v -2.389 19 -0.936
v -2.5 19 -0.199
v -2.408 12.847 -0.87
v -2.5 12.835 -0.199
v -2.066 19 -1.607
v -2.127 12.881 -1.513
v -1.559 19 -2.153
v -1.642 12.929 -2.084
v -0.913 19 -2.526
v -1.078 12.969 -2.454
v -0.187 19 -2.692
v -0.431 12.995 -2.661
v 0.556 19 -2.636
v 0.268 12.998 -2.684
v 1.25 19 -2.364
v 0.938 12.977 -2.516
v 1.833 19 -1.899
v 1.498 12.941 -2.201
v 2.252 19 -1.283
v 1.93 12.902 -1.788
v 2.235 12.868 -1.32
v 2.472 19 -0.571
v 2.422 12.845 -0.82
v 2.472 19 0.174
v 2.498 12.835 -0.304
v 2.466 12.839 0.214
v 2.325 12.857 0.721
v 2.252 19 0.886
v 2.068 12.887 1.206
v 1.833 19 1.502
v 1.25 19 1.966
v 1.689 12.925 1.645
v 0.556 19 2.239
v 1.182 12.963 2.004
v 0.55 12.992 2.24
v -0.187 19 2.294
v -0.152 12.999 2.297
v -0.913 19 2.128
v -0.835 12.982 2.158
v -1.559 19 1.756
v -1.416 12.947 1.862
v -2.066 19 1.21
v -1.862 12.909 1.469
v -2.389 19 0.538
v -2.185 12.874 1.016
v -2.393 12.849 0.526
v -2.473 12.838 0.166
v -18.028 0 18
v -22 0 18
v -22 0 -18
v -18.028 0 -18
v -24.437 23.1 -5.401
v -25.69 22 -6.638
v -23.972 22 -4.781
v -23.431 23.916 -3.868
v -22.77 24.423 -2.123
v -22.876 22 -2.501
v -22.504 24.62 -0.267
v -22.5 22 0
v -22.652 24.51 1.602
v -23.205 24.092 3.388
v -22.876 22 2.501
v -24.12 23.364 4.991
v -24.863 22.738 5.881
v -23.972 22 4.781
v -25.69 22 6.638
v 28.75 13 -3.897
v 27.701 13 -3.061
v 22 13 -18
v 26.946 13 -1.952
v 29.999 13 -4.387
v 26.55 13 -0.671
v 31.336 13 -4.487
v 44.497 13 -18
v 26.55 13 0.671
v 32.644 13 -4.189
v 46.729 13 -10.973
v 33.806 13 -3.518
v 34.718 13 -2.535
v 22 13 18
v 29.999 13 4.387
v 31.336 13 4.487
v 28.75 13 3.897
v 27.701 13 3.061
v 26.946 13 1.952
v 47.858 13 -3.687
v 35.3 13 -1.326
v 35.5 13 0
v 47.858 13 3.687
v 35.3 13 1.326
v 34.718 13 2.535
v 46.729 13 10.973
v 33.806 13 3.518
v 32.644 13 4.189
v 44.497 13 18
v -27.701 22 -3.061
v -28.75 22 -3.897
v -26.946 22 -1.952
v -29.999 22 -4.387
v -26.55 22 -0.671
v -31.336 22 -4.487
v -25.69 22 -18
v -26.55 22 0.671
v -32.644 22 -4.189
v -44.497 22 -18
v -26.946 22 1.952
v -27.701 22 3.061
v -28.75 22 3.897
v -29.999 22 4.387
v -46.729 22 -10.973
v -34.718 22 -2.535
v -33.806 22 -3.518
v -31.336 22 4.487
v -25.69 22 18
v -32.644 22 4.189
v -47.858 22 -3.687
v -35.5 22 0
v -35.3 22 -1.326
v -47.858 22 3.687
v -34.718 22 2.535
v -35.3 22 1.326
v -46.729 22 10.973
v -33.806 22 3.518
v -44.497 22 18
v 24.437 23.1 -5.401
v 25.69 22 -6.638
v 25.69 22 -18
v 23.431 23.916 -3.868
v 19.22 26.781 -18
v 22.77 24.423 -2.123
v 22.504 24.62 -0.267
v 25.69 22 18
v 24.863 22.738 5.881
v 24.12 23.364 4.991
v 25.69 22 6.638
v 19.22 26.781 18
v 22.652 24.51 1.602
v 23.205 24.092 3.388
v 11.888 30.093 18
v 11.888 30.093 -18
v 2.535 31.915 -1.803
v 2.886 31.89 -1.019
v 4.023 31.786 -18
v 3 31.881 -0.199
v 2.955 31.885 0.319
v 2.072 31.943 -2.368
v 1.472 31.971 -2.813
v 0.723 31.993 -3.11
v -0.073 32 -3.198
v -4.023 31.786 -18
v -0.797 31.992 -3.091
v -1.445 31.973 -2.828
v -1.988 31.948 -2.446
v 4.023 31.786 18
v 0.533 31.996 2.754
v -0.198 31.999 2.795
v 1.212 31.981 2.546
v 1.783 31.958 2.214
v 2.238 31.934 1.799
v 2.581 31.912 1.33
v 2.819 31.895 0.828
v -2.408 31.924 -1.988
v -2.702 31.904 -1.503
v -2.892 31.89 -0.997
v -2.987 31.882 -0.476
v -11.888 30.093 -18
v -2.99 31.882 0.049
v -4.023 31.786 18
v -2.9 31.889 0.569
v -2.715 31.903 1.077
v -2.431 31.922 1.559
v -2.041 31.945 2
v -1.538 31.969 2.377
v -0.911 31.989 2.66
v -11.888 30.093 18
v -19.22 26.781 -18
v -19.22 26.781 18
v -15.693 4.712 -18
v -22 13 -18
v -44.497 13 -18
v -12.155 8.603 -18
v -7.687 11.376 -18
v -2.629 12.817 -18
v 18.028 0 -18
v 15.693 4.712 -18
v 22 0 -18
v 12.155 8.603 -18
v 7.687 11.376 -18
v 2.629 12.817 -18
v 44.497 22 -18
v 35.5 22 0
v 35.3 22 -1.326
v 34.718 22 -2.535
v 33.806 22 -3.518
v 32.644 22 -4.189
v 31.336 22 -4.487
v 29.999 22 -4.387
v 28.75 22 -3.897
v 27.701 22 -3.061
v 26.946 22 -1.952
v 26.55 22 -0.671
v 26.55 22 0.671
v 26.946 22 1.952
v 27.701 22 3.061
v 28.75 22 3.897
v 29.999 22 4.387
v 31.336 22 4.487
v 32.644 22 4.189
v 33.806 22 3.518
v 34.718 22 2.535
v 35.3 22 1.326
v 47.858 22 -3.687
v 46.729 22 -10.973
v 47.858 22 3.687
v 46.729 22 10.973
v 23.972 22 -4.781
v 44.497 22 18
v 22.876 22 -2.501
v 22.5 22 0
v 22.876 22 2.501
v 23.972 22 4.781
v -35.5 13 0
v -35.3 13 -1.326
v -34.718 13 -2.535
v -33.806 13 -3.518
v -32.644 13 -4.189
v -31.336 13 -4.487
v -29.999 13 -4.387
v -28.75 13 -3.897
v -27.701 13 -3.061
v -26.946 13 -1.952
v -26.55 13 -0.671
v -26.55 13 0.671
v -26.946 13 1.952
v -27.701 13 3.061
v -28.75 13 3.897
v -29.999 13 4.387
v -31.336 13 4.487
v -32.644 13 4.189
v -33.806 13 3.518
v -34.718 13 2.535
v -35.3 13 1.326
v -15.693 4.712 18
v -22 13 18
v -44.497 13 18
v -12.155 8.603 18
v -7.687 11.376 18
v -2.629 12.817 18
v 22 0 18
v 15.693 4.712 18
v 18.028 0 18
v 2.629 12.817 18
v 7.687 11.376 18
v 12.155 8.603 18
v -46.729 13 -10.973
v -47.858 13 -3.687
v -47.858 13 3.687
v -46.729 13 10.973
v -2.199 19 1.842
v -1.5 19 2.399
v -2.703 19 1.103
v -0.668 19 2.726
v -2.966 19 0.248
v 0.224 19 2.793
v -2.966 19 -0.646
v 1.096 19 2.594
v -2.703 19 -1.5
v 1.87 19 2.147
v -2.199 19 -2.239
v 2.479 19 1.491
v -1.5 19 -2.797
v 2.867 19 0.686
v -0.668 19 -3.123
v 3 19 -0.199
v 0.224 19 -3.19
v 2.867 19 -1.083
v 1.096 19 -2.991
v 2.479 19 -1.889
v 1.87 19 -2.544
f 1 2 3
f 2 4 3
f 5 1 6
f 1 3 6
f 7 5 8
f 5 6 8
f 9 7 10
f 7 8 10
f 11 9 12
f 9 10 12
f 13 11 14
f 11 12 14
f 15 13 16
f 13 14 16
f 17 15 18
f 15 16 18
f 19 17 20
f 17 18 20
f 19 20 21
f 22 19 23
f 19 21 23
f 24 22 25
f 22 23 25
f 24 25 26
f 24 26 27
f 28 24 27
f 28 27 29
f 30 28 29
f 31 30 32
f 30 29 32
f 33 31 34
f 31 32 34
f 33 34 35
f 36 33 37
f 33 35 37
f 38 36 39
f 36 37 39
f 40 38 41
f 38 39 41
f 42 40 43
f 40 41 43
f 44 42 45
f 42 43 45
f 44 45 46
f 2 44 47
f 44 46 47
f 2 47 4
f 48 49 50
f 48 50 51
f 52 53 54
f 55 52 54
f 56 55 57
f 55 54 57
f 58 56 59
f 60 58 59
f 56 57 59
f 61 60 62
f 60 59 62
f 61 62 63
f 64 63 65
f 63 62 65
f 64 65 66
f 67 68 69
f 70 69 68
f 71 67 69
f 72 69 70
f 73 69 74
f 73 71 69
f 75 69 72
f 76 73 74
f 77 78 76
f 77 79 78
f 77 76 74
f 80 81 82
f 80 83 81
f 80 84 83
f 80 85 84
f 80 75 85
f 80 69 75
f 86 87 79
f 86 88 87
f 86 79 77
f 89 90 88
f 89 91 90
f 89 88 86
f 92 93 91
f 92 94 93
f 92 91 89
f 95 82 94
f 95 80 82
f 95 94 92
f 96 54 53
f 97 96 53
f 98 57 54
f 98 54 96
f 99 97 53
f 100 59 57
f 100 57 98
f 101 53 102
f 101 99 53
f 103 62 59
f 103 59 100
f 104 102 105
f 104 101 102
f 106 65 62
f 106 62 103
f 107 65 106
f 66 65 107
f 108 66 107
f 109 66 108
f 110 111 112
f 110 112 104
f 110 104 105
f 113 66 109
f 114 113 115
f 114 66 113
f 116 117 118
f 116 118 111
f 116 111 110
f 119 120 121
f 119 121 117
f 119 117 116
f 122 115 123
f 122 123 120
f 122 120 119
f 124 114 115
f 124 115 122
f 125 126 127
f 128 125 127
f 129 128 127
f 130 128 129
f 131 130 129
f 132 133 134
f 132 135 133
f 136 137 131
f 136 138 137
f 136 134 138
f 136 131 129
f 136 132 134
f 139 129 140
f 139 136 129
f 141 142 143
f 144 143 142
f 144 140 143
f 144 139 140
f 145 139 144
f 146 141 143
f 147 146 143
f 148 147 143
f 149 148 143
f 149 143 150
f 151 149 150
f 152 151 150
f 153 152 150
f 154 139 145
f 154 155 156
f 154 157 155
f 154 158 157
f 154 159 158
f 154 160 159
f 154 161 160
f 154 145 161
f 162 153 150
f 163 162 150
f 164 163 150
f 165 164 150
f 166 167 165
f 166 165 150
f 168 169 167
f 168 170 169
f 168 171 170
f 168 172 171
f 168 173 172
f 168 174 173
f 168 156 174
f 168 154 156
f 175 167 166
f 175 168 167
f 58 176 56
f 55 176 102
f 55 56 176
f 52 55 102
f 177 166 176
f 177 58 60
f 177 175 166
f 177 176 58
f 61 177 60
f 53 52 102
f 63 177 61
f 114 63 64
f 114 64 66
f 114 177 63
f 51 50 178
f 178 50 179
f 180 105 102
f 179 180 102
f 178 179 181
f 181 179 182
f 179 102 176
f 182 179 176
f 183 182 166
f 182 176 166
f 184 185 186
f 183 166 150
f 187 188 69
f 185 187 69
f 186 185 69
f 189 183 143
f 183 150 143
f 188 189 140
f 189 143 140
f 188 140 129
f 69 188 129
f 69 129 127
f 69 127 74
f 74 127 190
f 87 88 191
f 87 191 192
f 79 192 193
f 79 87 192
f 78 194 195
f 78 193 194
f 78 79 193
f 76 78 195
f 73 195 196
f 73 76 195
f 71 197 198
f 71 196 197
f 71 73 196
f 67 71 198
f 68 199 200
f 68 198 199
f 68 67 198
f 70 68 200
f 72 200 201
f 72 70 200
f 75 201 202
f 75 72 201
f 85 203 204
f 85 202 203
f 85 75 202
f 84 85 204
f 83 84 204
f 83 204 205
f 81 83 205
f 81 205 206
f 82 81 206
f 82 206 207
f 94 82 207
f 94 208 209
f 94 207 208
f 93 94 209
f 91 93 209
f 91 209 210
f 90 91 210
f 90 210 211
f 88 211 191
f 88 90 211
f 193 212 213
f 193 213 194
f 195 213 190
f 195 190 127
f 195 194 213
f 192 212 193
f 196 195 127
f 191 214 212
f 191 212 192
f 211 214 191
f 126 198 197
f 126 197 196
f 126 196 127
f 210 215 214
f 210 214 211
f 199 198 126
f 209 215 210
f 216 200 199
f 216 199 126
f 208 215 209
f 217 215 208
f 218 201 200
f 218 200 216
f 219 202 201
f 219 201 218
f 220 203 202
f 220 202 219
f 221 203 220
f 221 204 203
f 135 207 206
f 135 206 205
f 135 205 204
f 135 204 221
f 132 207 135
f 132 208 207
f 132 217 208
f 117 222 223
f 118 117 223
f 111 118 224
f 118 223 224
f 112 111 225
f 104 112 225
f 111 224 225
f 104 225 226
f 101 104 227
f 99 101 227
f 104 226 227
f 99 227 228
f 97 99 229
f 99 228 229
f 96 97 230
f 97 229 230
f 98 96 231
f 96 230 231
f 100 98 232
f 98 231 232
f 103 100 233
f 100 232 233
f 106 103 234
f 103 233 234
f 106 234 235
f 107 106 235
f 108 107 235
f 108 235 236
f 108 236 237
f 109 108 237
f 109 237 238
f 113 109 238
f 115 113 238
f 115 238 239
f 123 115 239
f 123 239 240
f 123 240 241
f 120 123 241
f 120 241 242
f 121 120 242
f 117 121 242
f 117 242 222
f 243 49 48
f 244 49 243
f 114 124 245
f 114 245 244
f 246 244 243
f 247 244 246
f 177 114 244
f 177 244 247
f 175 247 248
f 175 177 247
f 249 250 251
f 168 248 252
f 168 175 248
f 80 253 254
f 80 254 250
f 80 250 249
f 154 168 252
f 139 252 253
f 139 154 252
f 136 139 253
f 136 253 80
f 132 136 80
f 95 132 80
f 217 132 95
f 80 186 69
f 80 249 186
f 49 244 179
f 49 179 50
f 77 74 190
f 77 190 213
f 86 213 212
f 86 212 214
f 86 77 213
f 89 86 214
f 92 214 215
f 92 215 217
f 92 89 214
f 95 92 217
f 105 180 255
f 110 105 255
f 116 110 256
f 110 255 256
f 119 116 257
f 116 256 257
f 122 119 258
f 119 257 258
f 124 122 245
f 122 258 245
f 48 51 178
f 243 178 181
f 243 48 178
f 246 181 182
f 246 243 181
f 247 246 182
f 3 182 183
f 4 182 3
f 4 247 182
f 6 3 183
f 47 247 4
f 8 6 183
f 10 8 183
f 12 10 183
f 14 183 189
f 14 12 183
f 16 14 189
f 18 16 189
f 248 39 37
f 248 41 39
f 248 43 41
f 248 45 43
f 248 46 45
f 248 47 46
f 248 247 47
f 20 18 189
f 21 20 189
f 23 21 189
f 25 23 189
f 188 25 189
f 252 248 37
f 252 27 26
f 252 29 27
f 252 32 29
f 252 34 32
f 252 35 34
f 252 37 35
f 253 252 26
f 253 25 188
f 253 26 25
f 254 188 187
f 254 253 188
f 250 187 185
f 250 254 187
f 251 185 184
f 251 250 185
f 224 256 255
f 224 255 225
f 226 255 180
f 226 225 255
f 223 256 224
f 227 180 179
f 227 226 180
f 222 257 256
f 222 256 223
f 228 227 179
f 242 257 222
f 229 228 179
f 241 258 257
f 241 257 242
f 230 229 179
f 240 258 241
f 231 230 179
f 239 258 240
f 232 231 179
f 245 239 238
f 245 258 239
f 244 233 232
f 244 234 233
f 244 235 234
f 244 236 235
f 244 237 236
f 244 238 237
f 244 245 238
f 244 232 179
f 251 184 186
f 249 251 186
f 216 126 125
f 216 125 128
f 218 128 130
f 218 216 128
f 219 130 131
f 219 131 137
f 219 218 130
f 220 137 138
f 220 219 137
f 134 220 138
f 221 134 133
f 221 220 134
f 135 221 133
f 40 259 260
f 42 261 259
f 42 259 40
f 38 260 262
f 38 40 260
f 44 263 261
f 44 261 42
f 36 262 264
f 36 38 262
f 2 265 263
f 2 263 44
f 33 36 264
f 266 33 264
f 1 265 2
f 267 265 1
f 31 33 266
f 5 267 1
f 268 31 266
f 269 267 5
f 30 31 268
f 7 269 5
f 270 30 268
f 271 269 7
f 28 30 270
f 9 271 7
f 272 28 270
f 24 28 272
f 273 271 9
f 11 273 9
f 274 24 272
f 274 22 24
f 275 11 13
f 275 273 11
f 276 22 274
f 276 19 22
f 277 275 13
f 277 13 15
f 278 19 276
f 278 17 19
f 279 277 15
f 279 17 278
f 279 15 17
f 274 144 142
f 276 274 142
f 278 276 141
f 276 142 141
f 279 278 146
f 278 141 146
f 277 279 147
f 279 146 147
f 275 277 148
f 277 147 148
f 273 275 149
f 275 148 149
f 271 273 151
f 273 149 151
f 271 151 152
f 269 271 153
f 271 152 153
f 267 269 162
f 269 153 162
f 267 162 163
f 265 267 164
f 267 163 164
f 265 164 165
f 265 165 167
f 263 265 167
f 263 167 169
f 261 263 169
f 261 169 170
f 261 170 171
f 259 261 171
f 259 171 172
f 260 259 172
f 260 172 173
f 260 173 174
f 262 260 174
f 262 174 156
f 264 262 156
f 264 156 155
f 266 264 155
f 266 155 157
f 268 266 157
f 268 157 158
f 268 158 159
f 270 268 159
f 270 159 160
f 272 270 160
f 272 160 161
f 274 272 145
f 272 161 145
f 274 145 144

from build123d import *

# Parameters (mm, degrees)
BOSS_EXTRUDE1_DEPTH                     = 18
F_10_0MM_DOWEL_HOLE4_D                  = 9
CBORE_FOR_M5_HEX_HEAD_BOLT1_D           = 5
CBORE_FOR_M5_HEX_HEAD_BOLT1_CBORE_D     = 6
CBORE_FOR_M5_HEX_HEAD_BOLT1_CBORE_DEPTH = 13
CUT_EXTRUDE1_DEPTH                      = 20.0000001
CUT_EXTRUDE7_DEPTH                      = 10


with BuildPart() as part:
    # Sketch1 → Boss-Extrude1 (new body, symmetric)
    with BuildSketch(Plane.XY):
        with BuildLine():
            Line((22, 0), (22, 13))
            Line((22, 13), (50, 13))
            Line((50, 13), (50, 22))
            Line((50, 22), (25.690465157, 22))
            ThreePointArc((25.690465157, 22), (0, 32), (-25.690465157, 22))
            Line((-25.690465157, 22), (-50, 22))
            Line((-50, 22), (-50, 13))
            Line((-50, 13), (-22, 13))
            Line((-22, 13), (-22, 0))
            Line((-22, 0), (-18.027756377, 0))
            ThreePointArc((-18.027756377, 0), (0, 13), (18.027756377, 0))
            Line((18.027756377, 0), (22, 0))
        make_face()
    extrude(amount=BOSS_EXTRUDE1_DEPTH, both=True)

    # Ø10.0mm Dowel Hole4 (through all)
    with Locations(Plane(origin=(0, 22, 0), x_dir=(1, 0, 0), z_dir=(0, 1, 0))):
        with Locations((-31, 0)):
            f_10_0mm_dowel_hole4 = Hole(F_10_0MM_DOWEL_HOLE4_D / 2)

    # Mirror1: Ø10.0mm Dowel Hole4 across plane
    add(f_10_0mm_dowel_hole4.mirror(Plane(origin=(0, 0, 0), x_dir=(0, 0, 1), z_dir=(1, 0, 0))), mode=Mode.SUBTRACT)

    # CBORE for M5 Hex Head Bolt1 (through all)
    with Locations(Plane(origin=(0, 32, -0.198715446), x_dir=(1, 0, 0), z_dir=(0, 1, 0))):
        with Locations((0, 0)):
            CounterBoreHole(CBORE_FOR_M5_HEX_HEAD_BOLT1_D / 2, CBORE_FOR_M5_HEX_HEAD_BOLT1_CBORE_D / 2, CBORE_FOR_M5_HEX_HEAD_BOLT1_CBORE_DEPTH)

    # Sketch14 → Cut-Extrude1 (cut, through all)
    with BuildSketch(Plane.XZ.offset(-13)):
        with BuildLine():
            Line((-44.497190923, 18), (-50, 18))
            Line((-50, 18), (-50, -18))
            Line((-50, -18), (-44.359802254, -18.335974039))
            ThreePointArc((-44.359802254, -18.335974039), (-47.999656889, -0.181489808), (-44.497190923, 18))
        make_face()
        with BuildLine():
            Line((44.497190923, 18), (50, 18))
            Line((50, 18), (50, -18))
            Line((50, -18), (44.497190923, -18))
            ThreePointArc((44.497190923, -18), (48, 0), (44.497190923, 18))
        make_face()
    extrude(amount=-CUT_EXTRUDE1_DEPTH, mode=Mode.SUBTRACT)

    # Sketch17 → Cut-Extrude7 (cut)
    with BuildSketch(Plane(origin=(0, 22, 0), x_dir=(1, 0, 0), z_dir=(0, 1, 0))):
        with BuildLine():
            Line((-25.690465157, -6.637683312), (-25.690465157, 6.637683312))
            ThreePointArc((-25.690465157, 6.637683312), (-22.5, 0), (-25.690465157, -6.637683312))
        make_face()
    cut_extrude7 = extrude(amount=CUT_EXTRUDE7_DEPTH, mode=Mode.SUBTRACT)

    # Mirror3: Cut-Extrude7 across plane
    add(cut_extrude7.mirror(Plane(origin=(0, 0, 0), x_dir=(0, 0, 1), z_dir=(1, 0, 0))), mode=Mode.SUBTRACT)


solid = part.part
